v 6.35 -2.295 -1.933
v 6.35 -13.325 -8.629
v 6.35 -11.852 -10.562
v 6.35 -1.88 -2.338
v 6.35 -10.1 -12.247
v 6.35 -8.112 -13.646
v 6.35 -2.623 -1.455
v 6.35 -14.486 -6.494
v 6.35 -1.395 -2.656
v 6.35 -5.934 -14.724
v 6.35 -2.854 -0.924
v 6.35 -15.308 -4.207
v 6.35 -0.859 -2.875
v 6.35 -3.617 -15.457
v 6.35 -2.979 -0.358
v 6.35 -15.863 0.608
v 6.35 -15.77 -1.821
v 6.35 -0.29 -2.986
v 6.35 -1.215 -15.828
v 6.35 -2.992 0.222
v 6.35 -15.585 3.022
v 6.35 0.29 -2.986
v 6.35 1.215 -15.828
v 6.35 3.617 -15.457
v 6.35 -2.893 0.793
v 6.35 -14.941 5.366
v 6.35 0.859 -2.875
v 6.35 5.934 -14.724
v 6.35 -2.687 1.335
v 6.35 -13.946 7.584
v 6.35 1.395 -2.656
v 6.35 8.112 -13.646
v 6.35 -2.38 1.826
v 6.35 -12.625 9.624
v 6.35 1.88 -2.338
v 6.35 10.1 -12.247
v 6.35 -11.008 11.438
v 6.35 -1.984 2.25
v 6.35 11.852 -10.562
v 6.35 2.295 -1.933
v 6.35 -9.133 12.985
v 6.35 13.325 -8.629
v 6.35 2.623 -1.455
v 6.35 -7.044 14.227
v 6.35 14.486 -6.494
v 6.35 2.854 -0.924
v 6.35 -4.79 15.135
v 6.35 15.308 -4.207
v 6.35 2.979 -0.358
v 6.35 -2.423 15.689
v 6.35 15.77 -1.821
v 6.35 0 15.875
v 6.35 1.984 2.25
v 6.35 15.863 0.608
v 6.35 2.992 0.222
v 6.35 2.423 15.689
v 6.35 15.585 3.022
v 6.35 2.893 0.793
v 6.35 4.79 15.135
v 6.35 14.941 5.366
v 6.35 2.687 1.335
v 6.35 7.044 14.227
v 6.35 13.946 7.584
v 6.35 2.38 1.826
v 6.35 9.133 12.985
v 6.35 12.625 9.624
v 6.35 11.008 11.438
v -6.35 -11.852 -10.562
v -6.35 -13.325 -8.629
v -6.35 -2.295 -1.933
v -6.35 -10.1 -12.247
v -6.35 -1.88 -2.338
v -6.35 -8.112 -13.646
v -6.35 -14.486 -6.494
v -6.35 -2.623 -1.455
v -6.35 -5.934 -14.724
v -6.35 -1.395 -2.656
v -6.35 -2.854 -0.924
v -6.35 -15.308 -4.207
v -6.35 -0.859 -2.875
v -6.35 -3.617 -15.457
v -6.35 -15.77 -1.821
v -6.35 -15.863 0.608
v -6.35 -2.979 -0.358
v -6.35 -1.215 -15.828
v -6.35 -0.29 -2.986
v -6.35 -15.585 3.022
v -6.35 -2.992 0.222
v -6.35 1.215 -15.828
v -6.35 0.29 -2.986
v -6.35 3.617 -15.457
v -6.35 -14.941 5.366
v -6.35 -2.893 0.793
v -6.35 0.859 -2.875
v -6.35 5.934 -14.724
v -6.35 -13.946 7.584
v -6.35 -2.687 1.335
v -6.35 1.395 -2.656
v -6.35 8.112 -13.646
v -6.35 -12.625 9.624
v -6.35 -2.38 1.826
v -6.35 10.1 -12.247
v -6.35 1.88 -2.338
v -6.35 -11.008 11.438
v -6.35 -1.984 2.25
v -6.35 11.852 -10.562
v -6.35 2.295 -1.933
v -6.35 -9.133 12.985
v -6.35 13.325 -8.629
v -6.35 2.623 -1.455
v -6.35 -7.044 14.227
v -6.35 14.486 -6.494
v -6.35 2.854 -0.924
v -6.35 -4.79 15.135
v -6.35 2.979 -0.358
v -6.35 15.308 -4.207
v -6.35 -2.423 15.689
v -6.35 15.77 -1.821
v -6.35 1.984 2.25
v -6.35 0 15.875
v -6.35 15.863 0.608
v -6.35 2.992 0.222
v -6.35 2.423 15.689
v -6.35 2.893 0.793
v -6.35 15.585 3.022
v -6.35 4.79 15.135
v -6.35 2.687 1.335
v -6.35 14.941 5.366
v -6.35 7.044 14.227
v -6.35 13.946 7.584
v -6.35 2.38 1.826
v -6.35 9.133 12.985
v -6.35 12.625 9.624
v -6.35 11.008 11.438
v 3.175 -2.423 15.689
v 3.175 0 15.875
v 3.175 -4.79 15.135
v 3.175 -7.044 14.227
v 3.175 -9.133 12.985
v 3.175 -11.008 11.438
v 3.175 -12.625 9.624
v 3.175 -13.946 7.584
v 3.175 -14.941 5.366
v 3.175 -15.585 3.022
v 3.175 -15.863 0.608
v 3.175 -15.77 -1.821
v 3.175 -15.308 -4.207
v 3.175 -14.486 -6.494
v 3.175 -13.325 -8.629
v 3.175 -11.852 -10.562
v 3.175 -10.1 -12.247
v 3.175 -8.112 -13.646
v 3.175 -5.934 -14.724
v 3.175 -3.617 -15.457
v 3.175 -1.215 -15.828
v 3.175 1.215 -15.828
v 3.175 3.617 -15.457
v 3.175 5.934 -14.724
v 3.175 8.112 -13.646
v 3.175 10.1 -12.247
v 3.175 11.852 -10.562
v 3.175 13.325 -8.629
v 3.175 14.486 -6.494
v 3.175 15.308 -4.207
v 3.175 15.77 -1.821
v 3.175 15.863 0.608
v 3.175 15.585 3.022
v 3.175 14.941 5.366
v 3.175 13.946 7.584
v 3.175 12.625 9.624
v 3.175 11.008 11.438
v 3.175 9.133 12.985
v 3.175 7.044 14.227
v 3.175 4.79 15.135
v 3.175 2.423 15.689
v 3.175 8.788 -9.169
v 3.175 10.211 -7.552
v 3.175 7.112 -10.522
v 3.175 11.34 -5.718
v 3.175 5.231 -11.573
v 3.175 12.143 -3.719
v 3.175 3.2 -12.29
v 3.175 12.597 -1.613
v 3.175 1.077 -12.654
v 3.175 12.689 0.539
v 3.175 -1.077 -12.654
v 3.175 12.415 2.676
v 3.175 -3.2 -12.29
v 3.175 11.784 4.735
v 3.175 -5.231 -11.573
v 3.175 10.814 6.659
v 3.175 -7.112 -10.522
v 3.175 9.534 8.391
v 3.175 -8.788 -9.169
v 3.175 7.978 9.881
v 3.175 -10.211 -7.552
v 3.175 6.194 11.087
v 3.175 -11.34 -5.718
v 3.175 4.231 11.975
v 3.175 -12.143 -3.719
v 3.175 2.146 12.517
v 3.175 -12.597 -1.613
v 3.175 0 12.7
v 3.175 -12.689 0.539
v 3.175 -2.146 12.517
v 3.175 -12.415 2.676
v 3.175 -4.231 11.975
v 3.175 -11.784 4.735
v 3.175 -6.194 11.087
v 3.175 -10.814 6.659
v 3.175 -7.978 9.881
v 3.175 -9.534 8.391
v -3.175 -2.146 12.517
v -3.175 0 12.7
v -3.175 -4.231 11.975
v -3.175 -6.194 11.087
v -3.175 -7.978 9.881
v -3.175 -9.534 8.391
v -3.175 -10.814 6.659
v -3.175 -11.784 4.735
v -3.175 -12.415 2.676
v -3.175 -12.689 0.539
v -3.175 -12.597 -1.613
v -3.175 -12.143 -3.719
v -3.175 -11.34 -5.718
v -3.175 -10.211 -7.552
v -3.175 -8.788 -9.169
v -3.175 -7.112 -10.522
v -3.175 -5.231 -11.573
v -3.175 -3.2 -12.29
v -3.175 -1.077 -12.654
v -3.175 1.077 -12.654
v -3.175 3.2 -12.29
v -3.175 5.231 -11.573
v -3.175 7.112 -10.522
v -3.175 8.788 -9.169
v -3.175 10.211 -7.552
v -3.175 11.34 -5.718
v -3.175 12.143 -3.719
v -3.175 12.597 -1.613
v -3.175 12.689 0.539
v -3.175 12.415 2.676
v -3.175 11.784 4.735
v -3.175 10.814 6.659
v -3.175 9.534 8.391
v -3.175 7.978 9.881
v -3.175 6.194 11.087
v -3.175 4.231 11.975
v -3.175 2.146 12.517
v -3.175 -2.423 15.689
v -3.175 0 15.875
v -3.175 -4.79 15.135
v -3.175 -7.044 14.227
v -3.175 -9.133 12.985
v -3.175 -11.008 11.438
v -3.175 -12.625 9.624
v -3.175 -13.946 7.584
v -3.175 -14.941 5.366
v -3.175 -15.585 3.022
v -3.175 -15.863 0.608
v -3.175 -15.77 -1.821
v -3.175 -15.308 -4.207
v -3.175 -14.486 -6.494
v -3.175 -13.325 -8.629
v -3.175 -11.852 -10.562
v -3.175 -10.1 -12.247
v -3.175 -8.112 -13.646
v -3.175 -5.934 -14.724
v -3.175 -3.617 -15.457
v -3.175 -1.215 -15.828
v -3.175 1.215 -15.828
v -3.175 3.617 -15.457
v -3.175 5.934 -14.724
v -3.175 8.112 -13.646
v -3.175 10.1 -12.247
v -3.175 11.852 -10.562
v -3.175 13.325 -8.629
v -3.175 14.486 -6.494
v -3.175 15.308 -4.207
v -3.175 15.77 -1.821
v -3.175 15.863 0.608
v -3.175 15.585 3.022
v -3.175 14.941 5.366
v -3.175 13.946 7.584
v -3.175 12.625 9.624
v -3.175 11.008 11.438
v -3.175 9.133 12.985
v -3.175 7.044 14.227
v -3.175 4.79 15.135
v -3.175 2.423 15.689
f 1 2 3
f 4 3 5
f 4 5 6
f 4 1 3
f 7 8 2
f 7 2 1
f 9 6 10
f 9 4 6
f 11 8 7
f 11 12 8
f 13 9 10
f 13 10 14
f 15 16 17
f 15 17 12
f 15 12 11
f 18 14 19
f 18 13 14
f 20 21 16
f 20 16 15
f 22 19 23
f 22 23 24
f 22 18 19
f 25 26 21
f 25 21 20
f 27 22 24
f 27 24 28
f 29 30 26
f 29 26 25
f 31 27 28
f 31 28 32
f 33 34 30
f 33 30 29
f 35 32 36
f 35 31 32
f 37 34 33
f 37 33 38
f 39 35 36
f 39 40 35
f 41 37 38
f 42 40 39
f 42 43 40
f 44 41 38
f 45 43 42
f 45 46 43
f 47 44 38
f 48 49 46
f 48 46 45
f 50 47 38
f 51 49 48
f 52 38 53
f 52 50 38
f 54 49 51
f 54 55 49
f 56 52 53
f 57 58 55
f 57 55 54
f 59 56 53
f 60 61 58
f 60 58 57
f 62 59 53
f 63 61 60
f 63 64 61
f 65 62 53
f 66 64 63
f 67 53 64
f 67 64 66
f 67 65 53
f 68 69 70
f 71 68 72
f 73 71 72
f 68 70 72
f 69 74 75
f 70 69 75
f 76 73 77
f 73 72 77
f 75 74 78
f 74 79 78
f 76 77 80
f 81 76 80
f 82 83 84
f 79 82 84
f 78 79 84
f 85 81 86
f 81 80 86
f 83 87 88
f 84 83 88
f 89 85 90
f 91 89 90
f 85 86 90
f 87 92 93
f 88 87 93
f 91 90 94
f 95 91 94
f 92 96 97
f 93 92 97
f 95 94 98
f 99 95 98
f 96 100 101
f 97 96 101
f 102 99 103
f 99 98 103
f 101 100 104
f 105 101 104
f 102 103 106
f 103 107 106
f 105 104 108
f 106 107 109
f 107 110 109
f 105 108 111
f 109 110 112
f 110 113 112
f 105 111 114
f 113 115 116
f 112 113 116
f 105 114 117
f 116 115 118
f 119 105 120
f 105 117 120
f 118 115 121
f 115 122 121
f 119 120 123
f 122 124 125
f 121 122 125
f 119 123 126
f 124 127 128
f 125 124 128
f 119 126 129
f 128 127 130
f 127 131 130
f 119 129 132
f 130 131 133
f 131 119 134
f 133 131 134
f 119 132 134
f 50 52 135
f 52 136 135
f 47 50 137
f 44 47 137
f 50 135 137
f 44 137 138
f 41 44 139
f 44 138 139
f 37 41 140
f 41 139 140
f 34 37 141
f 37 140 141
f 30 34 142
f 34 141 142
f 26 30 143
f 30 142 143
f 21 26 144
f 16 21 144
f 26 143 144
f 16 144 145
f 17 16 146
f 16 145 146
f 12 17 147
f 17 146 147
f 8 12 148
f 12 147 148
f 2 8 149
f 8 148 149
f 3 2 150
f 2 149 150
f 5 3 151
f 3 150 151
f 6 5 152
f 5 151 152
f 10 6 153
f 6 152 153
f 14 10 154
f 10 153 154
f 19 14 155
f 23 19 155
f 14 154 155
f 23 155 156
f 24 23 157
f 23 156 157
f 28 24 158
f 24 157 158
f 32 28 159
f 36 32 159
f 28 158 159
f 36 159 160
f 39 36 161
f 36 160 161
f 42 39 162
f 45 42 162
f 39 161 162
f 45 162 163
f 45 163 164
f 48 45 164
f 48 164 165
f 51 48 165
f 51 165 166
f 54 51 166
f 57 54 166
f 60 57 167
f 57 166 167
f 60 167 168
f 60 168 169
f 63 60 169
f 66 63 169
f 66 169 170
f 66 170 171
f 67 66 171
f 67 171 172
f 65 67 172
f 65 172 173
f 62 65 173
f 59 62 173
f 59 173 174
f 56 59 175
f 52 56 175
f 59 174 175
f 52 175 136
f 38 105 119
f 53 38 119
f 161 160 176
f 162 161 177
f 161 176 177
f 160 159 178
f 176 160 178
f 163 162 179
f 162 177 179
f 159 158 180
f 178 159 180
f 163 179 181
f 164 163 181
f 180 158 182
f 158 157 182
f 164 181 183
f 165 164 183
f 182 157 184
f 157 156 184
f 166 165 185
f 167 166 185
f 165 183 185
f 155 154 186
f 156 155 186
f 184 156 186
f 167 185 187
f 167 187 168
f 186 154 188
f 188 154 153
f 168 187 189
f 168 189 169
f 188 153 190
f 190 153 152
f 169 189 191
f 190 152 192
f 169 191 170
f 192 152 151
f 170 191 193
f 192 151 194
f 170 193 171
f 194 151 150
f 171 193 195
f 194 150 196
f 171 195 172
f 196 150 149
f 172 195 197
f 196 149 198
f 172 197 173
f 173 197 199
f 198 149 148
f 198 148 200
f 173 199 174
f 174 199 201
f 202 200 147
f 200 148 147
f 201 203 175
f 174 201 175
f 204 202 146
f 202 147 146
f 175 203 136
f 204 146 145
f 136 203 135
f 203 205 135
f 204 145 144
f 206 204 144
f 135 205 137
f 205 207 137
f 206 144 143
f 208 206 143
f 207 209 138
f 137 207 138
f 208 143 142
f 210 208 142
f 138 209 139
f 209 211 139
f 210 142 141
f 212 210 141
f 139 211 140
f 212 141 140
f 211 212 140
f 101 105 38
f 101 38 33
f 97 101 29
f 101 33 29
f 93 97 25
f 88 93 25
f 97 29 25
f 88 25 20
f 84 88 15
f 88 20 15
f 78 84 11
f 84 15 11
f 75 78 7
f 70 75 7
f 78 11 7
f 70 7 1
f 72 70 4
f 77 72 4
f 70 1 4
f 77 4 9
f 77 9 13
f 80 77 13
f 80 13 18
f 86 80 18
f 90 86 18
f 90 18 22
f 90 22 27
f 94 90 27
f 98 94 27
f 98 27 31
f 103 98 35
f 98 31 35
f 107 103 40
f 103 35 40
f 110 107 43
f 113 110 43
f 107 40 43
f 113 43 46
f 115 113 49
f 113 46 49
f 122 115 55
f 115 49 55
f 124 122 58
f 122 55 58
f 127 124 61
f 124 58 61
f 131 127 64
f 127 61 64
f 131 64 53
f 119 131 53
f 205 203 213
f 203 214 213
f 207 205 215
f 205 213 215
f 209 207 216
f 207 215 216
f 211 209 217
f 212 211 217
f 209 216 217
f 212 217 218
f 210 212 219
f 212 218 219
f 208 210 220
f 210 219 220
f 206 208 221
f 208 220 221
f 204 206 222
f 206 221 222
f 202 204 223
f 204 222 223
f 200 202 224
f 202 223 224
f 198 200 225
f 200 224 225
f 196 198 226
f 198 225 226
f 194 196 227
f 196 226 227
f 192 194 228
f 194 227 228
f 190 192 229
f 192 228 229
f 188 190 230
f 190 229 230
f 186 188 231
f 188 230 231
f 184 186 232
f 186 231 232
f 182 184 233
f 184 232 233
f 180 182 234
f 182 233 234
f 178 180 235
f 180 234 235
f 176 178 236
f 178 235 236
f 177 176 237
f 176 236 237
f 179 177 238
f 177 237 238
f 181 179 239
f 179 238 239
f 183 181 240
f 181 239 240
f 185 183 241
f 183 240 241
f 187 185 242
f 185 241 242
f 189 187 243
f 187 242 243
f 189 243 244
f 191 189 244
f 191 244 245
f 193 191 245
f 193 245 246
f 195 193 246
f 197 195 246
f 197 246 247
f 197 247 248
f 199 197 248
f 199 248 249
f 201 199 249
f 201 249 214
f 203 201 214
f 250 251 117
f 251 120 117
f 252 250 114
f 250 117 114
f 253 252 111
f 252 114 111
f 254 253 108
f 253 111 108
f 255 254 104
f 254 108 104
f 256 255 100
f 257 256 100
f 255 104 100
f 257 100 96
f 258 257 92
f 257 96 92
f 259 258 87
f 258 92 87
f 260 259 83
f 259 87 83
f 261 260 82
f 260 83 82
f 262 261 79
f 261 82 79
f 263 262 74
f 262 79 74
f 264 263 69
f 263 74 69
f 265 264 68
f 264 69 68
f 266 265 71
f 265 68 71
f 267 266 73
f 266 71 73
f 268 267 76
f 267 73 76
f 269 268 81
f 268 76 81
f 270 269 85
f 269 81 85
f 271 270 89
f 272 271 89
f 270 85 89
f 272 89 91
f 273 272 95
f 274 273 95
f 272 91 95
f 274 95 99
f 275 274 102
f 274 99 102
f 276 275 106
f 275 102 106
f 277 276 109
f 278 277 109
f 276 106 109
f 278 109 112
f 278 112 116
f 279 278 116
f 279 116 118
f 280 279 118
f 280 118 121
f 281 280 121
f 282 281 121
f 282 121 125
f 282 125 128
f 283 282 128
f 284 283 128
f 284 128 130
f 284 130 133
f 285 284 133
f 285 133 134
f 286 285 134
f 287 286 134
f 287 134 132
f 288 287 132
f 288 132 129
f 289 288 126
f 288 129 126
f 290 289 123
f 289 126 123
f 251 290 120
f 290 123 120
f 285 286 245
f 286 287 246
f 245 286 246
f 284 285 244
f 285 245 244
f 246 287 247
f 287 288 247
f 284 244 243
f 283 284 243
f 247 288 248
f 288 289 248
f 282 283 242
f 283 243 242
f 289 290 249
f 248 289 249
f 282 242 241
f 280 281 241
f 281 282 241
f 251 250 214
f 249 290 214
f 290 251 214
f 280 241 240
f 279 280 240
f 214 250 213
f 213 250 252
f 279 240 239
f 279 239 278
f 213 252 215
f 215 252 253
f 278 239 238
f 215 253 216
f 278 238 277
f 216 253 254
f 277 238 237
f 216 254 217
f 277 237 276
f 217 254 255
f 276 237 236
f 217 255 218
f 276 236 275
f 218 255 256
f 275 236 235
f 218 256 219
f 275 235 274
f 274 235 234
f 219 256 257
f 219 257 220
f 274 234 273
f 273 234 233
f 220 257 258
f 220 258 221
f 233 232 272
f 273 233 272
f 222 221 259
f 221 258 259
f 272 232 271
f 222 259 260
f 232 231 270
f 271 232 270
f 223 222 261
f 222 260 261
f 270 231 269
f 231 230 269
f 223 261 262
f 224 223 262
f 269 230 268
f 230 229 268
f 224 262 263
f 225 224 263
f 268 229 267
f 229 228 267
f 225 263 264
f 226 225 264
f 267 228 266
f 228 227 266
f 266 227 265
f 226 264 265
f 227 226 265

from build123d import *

# Parameters (mm, degrees)
F3_DEPTH      = 6.35
F3_DEPTH_BACK = 6.35


with BuildPart() as f1:
    # F0 (on Front) → F1 (revolve)
    with BuildSketch(Plane.XZ):
        Polygon((-6.35, 15.875), (-6.35, 3), (6.35, 3), (6.35, 15.875), (3.175, 15.875), (3.175, 12.7), (-3.175, 12.7), (-3.175, 15.875), align=None)
    revolve(axis=Axis((0, 0, 0), (1, 0, 0)))

    # F2 (on Right) → F3 (join, two sides)
    with BuildSketch(Plane.YZ) as f3_sk:
        with BuildLine():
            Line((-1.9843134833, 2.25), (1.9843134833, 2.25))
            ThreePointArc((1.9843134833, 2.25), (0, 3), (-1.9843134833, 2.25))
        make_face()
    extrude(amount=F3_DEPTH)
    extrude(f3_sk.sketch, amount=-F3_DEPTH_BACK)


solid = f1.part
